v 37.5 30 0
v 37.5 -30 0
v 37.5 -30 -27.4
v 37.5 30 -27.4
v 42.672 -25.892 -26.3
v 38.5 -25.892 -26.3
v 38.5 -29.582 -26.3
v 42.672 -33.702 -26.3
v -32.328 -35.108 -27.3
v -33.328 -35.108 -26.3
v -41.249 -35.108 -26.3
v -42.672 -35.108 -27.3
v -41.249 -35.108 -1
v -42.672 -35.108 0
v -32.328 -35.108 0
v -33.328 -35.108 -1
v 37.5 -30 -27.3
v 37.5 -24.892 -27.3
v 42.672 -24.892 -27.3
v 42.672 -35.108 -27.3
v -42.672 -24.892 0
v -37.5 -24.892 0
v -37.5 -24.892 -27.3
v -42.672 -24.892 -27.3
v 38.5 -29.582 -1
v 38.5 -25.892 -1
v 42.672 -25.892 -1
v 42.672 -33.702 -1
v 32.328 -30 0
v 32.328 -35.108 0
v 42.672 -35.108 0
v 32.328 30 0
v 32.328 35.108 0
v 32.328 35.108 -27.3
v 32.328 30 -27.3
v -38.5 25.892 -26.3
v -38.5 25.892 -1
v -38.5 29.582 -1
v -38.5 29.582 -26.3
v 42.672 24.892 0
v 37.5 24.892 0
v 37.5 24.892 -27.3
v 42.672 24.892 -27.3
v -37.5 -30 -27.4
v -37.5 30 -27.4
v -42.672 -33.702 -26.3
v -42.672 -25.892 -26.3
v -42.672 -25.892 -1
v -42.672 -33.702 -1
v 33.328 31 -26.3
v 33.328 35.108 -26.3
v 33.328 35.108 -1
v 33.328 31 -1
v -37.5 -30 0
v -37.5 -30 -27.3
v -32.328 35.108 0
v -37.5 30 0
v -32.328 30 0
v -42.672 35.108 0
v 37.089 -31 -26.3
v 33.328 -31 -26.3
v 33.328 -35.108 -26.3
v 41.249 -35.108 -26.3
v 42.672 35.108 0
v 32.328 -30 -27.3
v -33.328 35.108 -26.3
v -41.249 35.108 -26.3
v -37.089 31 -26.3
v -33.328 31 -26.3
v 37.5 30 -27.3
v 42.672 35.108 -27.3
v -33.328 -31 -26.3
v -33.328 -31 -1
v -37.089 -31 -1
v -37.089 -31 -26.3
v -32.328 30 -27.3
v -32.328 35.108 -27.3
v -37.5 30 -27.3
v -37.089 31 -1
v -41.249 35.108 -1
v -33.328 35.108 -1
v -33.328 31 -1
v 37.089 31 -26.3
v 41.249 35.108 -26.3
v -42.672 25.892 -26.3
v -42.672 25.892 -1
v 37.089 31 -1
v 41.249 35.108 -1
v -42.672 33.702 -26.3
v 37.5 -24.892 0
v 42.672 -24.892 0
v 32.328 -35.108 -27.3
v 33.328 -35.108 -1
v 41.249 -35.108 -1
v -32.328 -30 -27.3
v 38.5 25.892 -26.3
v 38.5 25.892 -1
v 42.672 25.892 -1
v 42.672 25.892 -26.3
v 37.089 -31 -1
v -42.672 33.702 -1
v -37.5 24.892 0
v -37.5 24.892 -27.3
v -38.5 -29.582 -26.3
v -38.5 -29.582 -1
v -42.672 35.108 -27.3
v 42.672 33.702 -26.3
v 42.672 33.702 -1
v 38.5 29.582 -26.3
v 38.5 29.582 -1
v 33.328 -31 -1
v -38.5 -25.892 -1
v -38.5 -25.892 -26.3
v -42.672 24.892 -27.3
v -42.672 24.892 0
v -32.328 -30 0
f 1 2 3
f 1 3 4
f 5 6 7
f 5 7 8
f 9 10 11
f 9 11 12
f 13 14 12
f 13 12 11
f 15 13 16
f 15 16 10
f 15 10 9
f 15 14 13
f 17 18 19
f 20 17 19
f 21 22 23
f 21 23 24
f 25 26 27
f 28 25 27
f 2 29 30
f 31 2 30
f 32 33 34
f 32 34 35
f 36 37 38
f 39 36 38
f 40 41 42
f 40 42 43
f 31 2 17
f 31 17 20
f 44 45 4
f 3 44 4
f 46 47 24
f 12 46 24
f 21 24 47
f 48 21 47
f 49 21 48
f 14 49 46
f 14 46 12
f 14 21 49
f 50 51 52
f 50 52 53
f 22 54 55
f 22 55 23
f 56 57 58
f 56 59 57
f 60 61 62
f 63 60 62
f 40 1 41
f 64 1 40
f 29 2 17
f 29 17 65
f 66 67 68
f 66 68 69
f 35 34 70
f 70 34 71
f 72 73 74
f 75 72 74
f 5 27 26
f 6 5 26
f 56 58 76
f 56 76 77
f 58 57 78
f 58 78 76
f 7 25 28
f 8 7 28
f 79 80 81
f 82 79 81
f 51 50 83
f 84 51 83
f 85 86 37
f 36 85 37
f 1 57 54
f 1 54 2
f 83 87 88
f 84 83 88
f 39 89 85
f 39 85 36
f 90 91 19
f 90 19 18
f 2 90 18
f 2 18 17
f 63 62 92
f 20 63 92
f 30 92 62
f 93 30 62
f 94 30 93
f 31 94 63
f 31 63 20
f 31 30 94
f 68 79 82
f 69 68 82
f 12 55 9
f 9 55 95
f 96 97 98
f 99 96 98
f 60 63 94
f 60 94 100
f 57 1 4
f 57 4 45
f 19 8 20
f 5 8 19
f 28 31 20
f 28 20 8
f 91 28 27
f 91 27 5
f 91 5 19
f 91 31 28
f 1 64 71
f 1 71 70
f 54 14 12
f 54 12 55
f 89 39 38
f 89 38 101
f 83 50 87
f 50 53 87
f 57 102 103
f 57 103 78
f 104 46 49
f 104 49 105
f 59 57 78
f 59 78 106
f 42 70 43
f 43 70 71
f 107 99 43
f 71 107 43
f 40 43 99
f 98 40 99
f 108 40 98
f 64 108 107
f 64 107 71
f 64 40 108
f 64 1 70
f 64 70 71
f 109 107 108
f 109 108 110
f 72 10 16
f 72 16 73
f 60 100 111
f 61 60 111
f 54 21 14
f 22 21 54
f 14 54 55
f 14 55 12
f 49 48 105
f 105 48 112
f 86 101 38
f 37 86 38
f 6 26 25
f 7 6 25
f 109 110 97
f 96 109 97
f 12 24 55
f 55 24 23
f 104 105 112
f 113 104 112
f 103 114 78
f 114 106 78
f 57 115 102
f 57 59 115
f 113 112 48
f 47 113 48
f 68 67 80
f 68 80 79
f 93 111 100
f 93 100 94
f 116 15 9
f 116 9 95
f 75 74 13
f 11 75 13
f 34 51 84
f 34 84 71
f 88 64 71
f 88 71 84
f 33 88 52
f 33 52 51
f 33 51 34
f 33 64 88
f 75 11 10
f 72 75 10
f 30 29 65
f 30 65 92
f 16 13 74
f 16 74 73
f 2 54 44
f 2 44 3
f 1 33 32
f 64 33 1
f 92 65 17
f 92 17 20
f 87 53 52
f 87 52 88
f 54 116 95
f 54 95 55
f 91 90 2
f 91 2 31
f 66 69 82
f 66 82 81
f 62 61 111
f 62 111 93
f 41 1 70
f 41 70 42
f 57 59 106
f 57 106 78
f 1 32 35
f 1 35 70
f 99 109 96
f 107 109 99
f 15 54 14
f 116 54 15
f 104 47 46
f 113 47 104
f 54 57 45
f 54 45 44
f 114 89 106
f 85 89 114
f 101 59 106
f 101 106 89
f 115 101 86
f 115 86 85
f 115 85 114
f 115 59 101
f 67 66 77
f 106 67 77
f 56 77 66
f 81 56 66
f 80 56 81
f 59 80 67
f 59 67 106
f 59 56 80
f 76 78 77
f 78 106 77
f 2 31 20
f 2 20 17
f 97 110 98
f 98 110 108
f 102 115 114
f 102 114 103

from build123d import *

# Parameters (mm, degrees)
F0_W     = 5.1724143326
F0_H     = 5.1077616215
F1_DEPTH = 27.4
F2_DEPTH = 27.3
F3_DEPTH = 27.3
F4_T     = -1
F4_2_T   = -1
F4_3_T   = -1
F4_4_T   = -1
F4_5_T   = -1
F4_6_T   = -1
F4_7_T   = -1
F4_8_T   = -1


# Not quite as in the source:
# - the program builds the solid bodies; features that only make, move or delete a surface that nothing else refers to are left out


with BuildPart() as f1:
    # F0 (on Top) → F1 (new body)
    with BuildSketch(Plane.XY):
        Polygon((-32.3275856674, -30), (32.3275856674, -30), (32.3275856674, -24.8922383785), (37.5, -24.8922383785), (37.5, 24.8922383785), (32.3275856674, 24.8922383785), (32.3275856674, 30), (-32.3275856674, 30), (-32.3275856674, 24.8922383785), (-37.5, 24.8922383785), (-37.5, -24.8922383785), (-32.3275856674, -24.8922383785), align=None)
        with Locations((-34.9137928337, 27.4461191893)):
            Rectangle(F0_W, F0_H)
        with Locations((34.9137928337, 27.4461191893)):
            Rectangle(F0_W, F0_H)
        with Locations((34.9137928337, -27.4461191893)):
            Rectangle(F0_W, F0_H)
        with Locations((-34.9137928337, -27.4461191893)):
            Rectangle(F0_W, F0_H)
    extrude(amount=-F1_DEPTH)


with BuildPart() as f2:
    # F0 (on Top) → F2 (new body)
    with BuildSketch(Plane.XY):
        Polygon((-42.6724143326, 24.8922383785), (-37.5, 24.8922383785), (-37.5, 30), (-42.6724143326, 35.1077616215), align=None)
    extrude(amount=-F2_DEPTH)

    # F4#7
    f4_7_openings = [f2.faces().sort_by_distance(p)[0] for p in [
        (-42.672414, 30, -13.65),
    ]]
    offset(amount=F4_7_T, openings=f4_7_openings)


with BuildPart() as f2b:
    # F0 (on Top) → F2, piece 2 (new body)
    with BuildSketch(Plane.XY):
        Polygon((32.3275856674, 30), (37.5, 30), (42.6724143326, 35.1077616215), (32.3275856674, 35.1077616215), align=None)
    extrude(amount=-F2_DEPTH)

    # F4#3
    f4_3_openings = [f2b.faces().sort_by_distance(p)[0] for p in [
        (37.5, 35.107762, -13.65),
    ]]
    offset(amount=F4_3_T, openings=f4_3_openings)


with BuildPart() as f2c:
    # F0 (on Top) → F2, piece 3 (new body)
    with BuildSketch(Plane.XY):
        Polygon((37.5, -24.8922383785), (37.5, -30), (42.6724143326, -35.1077616215), (42.6724143326, -24.8922383785), align=None)
    extrude(amount=-F2_DEPTH)

    # F4
    f4_openings = [f2c.faces().sort_by_distance(p)[0] for p in [
        (42.672414, -30, -13.65),
    ]]
    offset(amount=F4_T, openings=f4_openings, kind=Kind.INTERSECTION)


with BuildPart() as f2d:
    # F0 (on Top) → F2, piece 4 (new body)
    with BuildSketch(Plane.XY):
        Polygon((-42.6724143326, -35.1077616215), (-37.5, -30), (-37.5, -24.8922383785), (-42.6724143326, -24.8922383785), align=None)
    extrude(amount=-F2_DEPTH)

    # F4#5
    f4_5_openings = [f2d.faces().sort_by_distance(p)[0] for p in [
        (-42.672414, -30, -13.65),
    ]]
    offset(amount=F4_5_T, openings=f4_5_openings)


with BuildPart() as f3:
    # F0 (on Top) → F3 (new body)
    with BuildSketch(Plane.XY):
        Polygon((-37.5, 30), (-32.3275856674, 30), (-32.3275856674, 35.1077616215), (-42.6724143326, 35.1077616215), align=None)
    extrude(amount=-F3_DEPTH)

    # F4#4
    f4_4_openings = [f3.faces().sort_by_distance(p)[0] for p in [
        (-37.5, 35.107762, -13.65),
    ]]
    offset(amount=F4_4_T, openings=f4_4_openings)


with BuildPart() as f3b:
    # F0 (on Top) → F3, piece 2 (new body)
    with BuildSketch(Plane.XY):
        Polygon((37.5, 30), (37.5, 24.8922383785), (42.6724143326, 24.8922383785), (42.6724143326, 35.1077616215), align=None)
    extrude(amount=-F3_DEPTH)

    # F4#2
    f4_2_openings = [f3b.faces().sort_by_distance(p)[0] for p in [
        (42.672414, 30, -13.65),
    ]]
    offset(amount=F4_2_T, openings=f4_2_openings)


with BuildPart() as f3c:
    # F0 (on Top) → F3, piece 3 (new body)
    with BuildSketch(Plane.XY):
        Polygon((42.6724143326, -35.1077616215), (37.5, -30), (32.3275856674, -30), (32.3275856674, -35.1077616215), align=None)
    extrude(amount=-F3_DEPTH)

    # F4#8
    f4_8_openings = [f3c.faces().sort_by_distance(p)[0] for p in [
        (37.5, -35.107762, -13.65),
    ]]
    offset(amount=F4_8_T, openings=f4_8_openings)


with BuildPart() as f3d:
    # F0 (on Top) → F3, piece 4 (new body)
    with BuildSketch(Plane.XY):
        Polygon((-32.3275856674, -35.1077616215), (-32.3275856674, -30), (-37.5, -30), (-42.6724143326, -35.1077616215), align=None)
    extrude(amount=-F3_DEPTH)

    # F4#6
    f4_6_openings = [f3d.faces().sort_by_distance(p)[0] for p in [
        (-37.5, -35.107762, -13.65),
    ]]
    offset(amount=F4_6_T, openings=f4_6_openings)


solid = Compound([f1.part, f2.part, f2b.part, f2c.part, f2d.part, f3.part, f3b.part, f3c.part, f3d.part])
